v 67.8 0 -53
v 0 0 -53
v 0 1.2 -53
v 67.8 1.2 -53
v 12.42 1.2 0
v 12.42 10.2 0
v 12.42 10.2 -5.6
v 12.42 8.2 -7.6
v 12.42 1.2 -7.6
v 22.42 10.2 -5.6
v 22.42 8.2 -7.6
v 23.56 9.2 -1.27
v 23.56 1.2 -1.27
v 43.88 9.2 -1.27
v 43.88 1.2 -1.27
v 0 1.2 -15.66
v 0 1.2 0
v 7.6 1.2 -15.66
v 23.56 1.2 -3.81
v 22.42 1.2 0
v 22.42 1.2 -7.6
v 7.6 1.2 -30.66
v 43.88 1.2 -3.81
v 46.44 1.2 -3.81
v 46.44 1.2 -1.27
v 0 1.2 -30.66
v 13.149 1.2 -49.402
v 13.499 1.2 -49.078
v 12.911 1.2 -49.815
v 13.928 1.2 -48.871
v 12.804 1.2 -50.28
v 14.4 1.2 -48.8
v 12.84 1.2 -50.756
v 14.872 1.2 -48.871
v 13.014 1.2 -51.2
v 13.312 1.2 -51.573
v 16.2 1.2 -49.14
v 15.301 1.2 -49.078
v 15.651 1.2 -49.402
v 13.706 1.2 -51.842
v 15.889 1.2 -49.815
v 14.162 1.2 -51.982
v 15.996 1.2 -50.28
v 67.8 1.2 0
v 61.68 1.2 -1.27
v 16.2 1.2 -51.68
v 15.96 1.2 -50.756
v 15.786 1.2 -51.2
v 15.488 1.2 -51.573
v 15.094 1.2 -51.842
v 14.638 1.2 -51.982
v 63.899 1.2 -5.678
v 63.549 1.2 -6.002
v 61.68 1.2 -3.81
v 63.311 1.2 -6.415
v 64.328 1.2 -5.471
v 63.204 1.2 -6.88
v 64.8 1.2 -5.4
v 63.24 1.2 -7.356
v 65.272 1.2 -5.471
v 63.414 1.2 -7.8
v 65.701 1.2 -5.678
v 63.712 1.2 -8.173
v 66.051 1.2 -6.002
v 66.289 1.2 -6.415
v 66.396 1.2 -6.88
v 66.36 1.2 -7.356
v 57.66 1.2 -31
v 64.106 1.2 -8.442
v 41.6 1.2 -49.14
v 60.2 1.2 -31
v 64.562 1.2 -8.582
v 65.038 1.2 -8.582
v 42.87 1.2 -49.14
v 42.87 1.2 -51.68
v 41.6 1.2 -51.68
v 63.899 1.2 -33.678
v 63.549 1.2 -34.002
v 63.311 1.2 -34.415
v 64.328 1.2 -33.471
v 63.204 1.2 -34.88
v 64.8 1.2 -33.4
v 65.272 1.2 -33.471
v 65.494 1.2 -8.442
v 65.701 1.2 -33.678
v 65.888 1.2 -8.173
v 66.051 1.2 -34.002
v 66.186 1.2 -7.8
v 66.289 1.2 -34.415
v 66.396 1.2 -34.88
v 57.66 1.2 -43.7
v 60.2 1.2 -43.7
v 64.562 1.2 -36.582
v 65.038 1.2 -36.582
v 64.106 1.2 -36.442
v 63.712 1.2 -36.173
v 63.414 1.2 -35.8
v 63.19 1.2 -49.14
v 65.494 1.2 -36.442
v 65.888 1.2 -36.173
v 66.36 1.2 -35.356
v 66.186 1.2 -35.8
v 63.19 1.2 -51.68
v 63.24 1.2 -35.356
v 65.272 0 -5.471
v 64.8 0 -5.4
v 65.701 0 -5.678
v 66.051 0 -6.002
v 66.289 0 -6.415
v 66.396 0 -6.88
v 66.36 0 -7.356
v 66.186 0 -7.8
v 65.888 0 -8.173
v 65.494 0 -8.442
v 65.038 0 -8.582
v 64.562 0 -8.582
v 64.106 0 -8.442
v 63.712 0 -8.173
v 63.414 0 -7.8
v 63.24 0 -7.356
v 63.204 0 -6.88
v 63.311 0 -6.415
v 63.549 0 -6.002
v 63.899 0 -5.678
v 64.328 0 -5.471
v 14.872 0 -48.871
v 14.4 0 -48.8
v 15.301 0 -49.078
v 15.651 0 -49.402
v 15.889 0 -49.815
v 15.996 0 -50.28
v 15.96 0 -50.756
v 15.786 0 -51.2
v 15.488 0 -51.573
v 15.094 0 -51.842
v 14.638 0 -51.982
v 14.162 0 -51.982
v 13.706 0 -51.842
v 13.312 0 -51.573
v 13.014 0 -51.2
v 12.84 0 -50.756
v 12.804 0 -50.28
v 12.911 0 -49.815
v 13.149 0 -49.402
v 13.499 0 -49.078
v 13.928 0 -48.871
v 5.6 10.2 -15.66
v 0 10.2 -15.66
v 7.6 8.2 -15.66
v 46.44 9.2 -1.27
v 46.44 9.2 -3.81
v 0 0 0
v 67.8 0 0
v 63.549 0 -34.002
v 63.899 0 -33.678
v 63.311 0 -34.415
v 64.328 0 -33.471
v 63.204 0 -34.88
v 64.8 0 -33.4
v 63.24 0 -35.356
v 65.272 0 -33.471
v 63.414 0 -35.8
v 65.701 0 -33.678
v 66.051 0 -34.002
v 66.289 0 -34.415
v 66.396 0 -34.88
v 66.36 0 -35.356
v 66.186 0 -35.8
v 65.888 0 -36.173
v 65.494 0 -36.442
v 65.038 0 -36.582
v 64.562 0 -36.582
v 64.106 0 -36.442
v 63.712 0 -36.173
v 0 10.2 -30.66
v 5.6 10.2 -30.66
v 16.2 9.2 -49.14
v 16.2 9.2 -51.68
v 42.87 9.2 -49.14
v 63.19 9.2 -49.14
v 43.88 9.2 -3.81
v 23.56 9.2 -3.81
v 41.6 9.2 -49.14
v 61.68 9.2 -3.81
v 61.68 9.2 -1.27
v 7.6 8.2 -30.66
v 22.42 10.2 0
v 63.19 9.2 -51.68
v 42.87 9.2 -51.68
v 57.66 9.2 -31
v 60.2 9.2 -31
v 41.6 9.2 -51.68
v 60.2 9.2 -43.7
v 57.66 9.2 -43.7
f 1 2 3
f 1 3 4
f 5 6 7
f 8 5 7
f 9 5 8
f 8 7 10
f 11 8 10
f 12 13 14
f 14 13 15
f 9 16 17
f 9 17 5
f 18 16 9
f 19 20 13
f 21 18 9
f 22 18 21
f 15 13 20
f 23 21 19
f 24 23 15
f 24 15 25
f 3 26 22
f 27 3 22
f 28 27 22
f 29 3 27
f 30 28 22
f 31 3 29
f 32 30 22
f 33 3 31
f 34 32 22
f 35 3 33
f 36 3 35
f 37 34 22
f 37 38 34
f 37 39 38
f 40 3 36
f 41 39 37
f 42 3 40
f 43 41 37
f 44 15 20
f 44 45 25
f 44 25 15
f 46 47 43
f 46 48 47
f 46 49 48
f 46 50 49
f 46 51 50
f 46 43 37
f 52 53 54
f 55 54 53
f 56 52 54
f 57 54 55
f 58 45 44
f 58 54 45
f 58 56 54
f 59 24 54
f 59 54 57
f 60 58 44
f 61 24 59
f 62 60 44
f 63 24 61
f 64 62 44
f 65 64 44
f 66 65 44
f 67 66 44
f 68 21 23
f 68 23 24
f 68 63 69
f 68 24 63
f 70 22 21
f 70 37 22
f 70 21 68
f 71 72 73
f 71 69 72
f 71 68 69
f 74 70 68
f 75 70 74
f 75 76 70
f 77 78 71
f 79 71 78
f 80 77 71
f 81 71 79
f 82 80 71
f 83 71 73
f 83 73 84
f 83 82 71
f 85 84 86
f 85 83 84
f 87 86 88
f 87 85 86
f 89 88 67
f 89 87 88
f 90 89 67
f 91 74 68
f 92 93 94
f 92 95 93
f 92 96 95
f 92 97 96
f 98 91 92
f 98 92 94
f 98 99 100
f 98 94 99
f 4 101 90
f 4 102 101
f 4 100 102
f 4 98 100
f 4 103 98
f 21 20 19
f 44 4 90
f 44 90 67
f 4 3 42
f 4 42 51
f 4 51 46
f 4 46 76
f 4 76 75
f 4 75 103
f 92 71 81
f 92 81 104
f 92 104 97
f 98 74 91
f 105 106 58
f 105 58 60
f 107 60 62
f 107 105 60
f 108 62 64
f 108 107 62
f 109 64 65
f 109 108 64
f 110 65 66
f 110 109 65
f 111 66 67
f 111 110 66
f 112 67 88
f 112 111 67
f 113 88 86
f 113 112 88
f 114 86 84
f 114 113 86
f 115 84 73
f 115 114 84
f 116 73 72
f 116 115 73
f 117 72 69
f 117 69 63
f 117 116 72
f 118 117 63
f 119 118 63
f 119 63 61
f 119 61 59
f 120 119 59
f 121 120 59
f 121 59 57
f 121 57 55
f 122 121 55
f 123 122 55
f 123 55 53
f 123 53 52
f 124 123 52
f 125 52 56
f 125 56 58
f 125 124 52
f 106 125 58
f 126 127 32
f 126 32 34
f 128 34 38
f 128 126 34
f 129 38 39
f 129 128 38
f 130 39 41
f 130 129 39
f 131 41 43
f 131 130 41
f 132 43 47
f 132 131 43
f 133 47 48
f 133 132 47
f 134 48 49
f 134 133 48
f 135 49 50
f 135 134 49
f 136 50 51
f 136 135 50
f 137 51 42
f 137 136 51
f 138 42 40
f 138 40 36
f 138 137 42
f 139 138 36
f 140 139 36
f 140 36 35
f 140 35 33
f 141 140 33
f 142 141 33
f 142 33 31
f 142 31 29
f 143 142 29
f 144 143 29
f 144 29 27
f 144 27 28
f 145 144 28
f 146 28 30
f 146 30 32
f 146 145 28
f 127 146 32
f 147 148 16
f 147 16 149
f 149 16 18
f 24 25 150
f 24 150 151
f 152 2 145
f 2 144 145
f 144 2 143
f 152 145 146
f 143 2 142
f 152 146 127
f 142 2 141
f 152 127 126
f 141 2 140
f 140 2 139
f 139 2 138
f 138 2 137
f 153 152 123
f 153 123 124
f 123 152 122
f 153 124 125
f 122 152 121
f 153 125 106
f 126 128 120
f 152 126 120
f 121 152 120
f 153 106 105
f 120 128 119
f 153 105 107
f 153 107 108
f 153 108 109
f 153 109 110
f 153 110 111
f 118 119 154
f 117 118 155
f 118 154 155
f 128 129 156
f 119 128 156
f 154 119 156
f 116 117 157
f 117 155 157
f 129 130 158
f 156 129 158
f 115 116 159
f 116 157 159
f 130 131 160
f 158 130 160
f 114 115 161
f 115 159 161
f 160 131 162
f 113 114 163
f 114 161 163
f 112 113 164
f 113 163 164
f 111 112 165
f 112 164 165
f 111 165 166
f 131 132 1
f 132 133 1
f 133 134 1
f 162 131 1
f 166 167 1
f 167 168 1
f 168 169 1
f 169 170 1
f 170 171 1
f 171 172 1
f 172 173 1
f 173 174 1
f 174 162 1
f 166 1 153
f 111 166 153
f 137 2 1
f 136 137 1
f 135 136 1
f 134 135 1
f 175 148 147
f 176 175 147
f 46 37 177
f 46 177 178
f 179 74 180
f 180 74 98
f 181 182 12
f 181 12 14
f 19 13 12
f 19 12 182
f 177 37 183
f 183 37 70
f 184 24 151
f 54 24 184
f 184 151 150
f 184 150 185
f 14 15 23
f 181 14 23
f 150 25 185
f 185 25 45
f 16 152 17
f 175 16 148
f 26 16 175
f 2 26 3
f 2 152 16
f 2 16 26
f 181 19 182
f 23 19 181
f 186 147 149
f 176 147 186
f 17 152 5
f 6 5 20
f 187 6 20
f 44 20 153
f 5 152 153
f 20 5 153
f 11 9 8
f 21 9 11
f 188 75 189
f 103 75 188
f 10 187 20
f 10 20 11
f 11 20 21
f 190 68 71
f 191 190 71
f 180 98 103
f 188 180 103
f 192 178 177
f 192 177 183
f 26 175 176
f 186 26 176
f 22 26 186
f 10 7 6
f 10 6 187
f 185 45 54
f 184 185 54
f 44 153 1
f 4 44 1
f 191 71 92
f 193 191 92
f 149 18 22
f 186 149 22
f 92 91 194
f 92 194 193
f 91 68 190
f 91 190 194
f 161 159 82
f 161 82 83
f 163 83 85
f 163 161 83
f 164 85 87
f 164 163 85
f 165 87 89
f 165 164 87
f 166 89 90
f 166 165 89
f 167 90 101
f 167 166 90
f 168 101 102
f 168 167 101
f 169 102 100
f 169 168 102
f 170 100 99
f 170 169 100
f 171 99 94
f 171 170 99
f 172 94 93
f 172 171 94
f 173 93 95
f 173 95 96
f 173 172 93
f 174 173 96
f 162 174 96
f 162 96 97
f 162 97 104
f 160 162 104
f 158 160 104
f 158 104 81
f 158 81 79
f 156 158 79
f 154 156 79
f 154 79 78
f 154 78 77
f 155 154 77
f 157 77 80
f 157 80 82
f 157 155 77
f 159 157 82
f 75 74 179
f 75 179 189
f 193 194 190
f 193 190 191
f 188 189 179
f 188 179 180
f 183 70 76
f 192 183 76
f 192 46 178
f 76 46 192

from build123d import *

# Parameters (mm, degrees)
SKETCH_1_W      = 67.8
SKETCH_1_H      = 53
SKETCH_1_R      = 1.6
EXTRUDE_1_DEPTH = 1.2
SKETCH_2_W      = 25.4
SKETCH_2_H      = 2.54
SKETCH_2_W_2    = 20.32
SKETCH_2_W_3    = 15.24
SKETCH_2_W_4    = 2.54
SKETCH_2_H_2    = 12.7
EXTRUDE_2_DEPTH = 8
SKETCH_3_W      = 7.6
SKETCH_3_H      = 15
SKETCH_3_W_2    = 10
SKETCH_3_H_2    = 7.6
EXTRUDE_3_DEPTH = 9
CHAMFER_1_SIZE  = 2


with BuildPart() as part:
    # 草图1 → 凸台-拉伸1 (new body)
    with BuildSketch(Plane(origin=(0, 0, 0), x_dir=(1, 0, 0), z_dir=(0, 1, 0))):
        with Locations((33.9, 26.5)):
            Rectangle(SKETCH_1_W, SKETCH_1_H)
        with Locations(Location((64.8, 35, 0), (0, 0, 270))):
            Circle(SKETCH_1_R, mode=Mode.SUBTRACT)
        with Locations(Location((64.8, 7, 0), (0, 0, 270))):
            Circle(SKETCH_1_R, mode=Mode.SUBTRACT)
        with Locations(Location((14.4, 50.4, 0), (0, 0, 270))):
            Circle(SKETCH_1_R, mode=Mode.SUBTRACT)
    extrude(amount=EXTRUDE_1_DEPTH)

    # 草图2 → 凸台-拉伸2 (add)
    with BuildSketch(Plane(origin=(0, 1.2, 0), x_dir=(1, 0, 0), z_dir=(0, 1, 0))):
        with Locations((28.9, 50.41)):
            Rectangle(SKETCH_2_W, SKETCH_2_H)
        with Locations((53.03, 50.41)):
            Rectangle(SKETCH_2_W_2, SKETCH_2_H)
        with Locations((33.72, 2.54)):
            Rectangle(SKETCH_2_W_2, SKETCH_2_H)
        with Locations((54.06, 2.54)):
            Rectangle(SKETCH_2_W_3, SKETCH_2_H)
        with Locations((58.93, 37.35)):
            Rectangle(SKETCH_2_W_4, SKETCH_2_H_2)
    extrude(amount=EXTRUDE_2_DEPTH)

    # 草图3 → 凸台-拉伸3 (add)
    with BuildSketch(Plane(origin=(0, 1.2, 0), x_dir=(1, 0, 0), z_dir=(0, 1, 0))):
        with Locations((3.8, 23.16)):
            Rectangle(SKETCH_3_W, SKETCH_3_H)
        with Locations((17.42, 3.8)):
            Rectangle(SKETCH_3_W_2, SKETCH_3_H_2)
    extrude(amount=EXTRUDE_3_DEPTH)

    # 倒角1
    chamfer_1_edges = [part.edges().sort_by_distance(p)[0] for p in [
        (17.42, 10.2, -7.6),
        (7.6, 10.2, -23.16),
    ]]
    chamfer(chamfer_1_edges, length=CHAMFER_1_SIZE)


solid = part.part
